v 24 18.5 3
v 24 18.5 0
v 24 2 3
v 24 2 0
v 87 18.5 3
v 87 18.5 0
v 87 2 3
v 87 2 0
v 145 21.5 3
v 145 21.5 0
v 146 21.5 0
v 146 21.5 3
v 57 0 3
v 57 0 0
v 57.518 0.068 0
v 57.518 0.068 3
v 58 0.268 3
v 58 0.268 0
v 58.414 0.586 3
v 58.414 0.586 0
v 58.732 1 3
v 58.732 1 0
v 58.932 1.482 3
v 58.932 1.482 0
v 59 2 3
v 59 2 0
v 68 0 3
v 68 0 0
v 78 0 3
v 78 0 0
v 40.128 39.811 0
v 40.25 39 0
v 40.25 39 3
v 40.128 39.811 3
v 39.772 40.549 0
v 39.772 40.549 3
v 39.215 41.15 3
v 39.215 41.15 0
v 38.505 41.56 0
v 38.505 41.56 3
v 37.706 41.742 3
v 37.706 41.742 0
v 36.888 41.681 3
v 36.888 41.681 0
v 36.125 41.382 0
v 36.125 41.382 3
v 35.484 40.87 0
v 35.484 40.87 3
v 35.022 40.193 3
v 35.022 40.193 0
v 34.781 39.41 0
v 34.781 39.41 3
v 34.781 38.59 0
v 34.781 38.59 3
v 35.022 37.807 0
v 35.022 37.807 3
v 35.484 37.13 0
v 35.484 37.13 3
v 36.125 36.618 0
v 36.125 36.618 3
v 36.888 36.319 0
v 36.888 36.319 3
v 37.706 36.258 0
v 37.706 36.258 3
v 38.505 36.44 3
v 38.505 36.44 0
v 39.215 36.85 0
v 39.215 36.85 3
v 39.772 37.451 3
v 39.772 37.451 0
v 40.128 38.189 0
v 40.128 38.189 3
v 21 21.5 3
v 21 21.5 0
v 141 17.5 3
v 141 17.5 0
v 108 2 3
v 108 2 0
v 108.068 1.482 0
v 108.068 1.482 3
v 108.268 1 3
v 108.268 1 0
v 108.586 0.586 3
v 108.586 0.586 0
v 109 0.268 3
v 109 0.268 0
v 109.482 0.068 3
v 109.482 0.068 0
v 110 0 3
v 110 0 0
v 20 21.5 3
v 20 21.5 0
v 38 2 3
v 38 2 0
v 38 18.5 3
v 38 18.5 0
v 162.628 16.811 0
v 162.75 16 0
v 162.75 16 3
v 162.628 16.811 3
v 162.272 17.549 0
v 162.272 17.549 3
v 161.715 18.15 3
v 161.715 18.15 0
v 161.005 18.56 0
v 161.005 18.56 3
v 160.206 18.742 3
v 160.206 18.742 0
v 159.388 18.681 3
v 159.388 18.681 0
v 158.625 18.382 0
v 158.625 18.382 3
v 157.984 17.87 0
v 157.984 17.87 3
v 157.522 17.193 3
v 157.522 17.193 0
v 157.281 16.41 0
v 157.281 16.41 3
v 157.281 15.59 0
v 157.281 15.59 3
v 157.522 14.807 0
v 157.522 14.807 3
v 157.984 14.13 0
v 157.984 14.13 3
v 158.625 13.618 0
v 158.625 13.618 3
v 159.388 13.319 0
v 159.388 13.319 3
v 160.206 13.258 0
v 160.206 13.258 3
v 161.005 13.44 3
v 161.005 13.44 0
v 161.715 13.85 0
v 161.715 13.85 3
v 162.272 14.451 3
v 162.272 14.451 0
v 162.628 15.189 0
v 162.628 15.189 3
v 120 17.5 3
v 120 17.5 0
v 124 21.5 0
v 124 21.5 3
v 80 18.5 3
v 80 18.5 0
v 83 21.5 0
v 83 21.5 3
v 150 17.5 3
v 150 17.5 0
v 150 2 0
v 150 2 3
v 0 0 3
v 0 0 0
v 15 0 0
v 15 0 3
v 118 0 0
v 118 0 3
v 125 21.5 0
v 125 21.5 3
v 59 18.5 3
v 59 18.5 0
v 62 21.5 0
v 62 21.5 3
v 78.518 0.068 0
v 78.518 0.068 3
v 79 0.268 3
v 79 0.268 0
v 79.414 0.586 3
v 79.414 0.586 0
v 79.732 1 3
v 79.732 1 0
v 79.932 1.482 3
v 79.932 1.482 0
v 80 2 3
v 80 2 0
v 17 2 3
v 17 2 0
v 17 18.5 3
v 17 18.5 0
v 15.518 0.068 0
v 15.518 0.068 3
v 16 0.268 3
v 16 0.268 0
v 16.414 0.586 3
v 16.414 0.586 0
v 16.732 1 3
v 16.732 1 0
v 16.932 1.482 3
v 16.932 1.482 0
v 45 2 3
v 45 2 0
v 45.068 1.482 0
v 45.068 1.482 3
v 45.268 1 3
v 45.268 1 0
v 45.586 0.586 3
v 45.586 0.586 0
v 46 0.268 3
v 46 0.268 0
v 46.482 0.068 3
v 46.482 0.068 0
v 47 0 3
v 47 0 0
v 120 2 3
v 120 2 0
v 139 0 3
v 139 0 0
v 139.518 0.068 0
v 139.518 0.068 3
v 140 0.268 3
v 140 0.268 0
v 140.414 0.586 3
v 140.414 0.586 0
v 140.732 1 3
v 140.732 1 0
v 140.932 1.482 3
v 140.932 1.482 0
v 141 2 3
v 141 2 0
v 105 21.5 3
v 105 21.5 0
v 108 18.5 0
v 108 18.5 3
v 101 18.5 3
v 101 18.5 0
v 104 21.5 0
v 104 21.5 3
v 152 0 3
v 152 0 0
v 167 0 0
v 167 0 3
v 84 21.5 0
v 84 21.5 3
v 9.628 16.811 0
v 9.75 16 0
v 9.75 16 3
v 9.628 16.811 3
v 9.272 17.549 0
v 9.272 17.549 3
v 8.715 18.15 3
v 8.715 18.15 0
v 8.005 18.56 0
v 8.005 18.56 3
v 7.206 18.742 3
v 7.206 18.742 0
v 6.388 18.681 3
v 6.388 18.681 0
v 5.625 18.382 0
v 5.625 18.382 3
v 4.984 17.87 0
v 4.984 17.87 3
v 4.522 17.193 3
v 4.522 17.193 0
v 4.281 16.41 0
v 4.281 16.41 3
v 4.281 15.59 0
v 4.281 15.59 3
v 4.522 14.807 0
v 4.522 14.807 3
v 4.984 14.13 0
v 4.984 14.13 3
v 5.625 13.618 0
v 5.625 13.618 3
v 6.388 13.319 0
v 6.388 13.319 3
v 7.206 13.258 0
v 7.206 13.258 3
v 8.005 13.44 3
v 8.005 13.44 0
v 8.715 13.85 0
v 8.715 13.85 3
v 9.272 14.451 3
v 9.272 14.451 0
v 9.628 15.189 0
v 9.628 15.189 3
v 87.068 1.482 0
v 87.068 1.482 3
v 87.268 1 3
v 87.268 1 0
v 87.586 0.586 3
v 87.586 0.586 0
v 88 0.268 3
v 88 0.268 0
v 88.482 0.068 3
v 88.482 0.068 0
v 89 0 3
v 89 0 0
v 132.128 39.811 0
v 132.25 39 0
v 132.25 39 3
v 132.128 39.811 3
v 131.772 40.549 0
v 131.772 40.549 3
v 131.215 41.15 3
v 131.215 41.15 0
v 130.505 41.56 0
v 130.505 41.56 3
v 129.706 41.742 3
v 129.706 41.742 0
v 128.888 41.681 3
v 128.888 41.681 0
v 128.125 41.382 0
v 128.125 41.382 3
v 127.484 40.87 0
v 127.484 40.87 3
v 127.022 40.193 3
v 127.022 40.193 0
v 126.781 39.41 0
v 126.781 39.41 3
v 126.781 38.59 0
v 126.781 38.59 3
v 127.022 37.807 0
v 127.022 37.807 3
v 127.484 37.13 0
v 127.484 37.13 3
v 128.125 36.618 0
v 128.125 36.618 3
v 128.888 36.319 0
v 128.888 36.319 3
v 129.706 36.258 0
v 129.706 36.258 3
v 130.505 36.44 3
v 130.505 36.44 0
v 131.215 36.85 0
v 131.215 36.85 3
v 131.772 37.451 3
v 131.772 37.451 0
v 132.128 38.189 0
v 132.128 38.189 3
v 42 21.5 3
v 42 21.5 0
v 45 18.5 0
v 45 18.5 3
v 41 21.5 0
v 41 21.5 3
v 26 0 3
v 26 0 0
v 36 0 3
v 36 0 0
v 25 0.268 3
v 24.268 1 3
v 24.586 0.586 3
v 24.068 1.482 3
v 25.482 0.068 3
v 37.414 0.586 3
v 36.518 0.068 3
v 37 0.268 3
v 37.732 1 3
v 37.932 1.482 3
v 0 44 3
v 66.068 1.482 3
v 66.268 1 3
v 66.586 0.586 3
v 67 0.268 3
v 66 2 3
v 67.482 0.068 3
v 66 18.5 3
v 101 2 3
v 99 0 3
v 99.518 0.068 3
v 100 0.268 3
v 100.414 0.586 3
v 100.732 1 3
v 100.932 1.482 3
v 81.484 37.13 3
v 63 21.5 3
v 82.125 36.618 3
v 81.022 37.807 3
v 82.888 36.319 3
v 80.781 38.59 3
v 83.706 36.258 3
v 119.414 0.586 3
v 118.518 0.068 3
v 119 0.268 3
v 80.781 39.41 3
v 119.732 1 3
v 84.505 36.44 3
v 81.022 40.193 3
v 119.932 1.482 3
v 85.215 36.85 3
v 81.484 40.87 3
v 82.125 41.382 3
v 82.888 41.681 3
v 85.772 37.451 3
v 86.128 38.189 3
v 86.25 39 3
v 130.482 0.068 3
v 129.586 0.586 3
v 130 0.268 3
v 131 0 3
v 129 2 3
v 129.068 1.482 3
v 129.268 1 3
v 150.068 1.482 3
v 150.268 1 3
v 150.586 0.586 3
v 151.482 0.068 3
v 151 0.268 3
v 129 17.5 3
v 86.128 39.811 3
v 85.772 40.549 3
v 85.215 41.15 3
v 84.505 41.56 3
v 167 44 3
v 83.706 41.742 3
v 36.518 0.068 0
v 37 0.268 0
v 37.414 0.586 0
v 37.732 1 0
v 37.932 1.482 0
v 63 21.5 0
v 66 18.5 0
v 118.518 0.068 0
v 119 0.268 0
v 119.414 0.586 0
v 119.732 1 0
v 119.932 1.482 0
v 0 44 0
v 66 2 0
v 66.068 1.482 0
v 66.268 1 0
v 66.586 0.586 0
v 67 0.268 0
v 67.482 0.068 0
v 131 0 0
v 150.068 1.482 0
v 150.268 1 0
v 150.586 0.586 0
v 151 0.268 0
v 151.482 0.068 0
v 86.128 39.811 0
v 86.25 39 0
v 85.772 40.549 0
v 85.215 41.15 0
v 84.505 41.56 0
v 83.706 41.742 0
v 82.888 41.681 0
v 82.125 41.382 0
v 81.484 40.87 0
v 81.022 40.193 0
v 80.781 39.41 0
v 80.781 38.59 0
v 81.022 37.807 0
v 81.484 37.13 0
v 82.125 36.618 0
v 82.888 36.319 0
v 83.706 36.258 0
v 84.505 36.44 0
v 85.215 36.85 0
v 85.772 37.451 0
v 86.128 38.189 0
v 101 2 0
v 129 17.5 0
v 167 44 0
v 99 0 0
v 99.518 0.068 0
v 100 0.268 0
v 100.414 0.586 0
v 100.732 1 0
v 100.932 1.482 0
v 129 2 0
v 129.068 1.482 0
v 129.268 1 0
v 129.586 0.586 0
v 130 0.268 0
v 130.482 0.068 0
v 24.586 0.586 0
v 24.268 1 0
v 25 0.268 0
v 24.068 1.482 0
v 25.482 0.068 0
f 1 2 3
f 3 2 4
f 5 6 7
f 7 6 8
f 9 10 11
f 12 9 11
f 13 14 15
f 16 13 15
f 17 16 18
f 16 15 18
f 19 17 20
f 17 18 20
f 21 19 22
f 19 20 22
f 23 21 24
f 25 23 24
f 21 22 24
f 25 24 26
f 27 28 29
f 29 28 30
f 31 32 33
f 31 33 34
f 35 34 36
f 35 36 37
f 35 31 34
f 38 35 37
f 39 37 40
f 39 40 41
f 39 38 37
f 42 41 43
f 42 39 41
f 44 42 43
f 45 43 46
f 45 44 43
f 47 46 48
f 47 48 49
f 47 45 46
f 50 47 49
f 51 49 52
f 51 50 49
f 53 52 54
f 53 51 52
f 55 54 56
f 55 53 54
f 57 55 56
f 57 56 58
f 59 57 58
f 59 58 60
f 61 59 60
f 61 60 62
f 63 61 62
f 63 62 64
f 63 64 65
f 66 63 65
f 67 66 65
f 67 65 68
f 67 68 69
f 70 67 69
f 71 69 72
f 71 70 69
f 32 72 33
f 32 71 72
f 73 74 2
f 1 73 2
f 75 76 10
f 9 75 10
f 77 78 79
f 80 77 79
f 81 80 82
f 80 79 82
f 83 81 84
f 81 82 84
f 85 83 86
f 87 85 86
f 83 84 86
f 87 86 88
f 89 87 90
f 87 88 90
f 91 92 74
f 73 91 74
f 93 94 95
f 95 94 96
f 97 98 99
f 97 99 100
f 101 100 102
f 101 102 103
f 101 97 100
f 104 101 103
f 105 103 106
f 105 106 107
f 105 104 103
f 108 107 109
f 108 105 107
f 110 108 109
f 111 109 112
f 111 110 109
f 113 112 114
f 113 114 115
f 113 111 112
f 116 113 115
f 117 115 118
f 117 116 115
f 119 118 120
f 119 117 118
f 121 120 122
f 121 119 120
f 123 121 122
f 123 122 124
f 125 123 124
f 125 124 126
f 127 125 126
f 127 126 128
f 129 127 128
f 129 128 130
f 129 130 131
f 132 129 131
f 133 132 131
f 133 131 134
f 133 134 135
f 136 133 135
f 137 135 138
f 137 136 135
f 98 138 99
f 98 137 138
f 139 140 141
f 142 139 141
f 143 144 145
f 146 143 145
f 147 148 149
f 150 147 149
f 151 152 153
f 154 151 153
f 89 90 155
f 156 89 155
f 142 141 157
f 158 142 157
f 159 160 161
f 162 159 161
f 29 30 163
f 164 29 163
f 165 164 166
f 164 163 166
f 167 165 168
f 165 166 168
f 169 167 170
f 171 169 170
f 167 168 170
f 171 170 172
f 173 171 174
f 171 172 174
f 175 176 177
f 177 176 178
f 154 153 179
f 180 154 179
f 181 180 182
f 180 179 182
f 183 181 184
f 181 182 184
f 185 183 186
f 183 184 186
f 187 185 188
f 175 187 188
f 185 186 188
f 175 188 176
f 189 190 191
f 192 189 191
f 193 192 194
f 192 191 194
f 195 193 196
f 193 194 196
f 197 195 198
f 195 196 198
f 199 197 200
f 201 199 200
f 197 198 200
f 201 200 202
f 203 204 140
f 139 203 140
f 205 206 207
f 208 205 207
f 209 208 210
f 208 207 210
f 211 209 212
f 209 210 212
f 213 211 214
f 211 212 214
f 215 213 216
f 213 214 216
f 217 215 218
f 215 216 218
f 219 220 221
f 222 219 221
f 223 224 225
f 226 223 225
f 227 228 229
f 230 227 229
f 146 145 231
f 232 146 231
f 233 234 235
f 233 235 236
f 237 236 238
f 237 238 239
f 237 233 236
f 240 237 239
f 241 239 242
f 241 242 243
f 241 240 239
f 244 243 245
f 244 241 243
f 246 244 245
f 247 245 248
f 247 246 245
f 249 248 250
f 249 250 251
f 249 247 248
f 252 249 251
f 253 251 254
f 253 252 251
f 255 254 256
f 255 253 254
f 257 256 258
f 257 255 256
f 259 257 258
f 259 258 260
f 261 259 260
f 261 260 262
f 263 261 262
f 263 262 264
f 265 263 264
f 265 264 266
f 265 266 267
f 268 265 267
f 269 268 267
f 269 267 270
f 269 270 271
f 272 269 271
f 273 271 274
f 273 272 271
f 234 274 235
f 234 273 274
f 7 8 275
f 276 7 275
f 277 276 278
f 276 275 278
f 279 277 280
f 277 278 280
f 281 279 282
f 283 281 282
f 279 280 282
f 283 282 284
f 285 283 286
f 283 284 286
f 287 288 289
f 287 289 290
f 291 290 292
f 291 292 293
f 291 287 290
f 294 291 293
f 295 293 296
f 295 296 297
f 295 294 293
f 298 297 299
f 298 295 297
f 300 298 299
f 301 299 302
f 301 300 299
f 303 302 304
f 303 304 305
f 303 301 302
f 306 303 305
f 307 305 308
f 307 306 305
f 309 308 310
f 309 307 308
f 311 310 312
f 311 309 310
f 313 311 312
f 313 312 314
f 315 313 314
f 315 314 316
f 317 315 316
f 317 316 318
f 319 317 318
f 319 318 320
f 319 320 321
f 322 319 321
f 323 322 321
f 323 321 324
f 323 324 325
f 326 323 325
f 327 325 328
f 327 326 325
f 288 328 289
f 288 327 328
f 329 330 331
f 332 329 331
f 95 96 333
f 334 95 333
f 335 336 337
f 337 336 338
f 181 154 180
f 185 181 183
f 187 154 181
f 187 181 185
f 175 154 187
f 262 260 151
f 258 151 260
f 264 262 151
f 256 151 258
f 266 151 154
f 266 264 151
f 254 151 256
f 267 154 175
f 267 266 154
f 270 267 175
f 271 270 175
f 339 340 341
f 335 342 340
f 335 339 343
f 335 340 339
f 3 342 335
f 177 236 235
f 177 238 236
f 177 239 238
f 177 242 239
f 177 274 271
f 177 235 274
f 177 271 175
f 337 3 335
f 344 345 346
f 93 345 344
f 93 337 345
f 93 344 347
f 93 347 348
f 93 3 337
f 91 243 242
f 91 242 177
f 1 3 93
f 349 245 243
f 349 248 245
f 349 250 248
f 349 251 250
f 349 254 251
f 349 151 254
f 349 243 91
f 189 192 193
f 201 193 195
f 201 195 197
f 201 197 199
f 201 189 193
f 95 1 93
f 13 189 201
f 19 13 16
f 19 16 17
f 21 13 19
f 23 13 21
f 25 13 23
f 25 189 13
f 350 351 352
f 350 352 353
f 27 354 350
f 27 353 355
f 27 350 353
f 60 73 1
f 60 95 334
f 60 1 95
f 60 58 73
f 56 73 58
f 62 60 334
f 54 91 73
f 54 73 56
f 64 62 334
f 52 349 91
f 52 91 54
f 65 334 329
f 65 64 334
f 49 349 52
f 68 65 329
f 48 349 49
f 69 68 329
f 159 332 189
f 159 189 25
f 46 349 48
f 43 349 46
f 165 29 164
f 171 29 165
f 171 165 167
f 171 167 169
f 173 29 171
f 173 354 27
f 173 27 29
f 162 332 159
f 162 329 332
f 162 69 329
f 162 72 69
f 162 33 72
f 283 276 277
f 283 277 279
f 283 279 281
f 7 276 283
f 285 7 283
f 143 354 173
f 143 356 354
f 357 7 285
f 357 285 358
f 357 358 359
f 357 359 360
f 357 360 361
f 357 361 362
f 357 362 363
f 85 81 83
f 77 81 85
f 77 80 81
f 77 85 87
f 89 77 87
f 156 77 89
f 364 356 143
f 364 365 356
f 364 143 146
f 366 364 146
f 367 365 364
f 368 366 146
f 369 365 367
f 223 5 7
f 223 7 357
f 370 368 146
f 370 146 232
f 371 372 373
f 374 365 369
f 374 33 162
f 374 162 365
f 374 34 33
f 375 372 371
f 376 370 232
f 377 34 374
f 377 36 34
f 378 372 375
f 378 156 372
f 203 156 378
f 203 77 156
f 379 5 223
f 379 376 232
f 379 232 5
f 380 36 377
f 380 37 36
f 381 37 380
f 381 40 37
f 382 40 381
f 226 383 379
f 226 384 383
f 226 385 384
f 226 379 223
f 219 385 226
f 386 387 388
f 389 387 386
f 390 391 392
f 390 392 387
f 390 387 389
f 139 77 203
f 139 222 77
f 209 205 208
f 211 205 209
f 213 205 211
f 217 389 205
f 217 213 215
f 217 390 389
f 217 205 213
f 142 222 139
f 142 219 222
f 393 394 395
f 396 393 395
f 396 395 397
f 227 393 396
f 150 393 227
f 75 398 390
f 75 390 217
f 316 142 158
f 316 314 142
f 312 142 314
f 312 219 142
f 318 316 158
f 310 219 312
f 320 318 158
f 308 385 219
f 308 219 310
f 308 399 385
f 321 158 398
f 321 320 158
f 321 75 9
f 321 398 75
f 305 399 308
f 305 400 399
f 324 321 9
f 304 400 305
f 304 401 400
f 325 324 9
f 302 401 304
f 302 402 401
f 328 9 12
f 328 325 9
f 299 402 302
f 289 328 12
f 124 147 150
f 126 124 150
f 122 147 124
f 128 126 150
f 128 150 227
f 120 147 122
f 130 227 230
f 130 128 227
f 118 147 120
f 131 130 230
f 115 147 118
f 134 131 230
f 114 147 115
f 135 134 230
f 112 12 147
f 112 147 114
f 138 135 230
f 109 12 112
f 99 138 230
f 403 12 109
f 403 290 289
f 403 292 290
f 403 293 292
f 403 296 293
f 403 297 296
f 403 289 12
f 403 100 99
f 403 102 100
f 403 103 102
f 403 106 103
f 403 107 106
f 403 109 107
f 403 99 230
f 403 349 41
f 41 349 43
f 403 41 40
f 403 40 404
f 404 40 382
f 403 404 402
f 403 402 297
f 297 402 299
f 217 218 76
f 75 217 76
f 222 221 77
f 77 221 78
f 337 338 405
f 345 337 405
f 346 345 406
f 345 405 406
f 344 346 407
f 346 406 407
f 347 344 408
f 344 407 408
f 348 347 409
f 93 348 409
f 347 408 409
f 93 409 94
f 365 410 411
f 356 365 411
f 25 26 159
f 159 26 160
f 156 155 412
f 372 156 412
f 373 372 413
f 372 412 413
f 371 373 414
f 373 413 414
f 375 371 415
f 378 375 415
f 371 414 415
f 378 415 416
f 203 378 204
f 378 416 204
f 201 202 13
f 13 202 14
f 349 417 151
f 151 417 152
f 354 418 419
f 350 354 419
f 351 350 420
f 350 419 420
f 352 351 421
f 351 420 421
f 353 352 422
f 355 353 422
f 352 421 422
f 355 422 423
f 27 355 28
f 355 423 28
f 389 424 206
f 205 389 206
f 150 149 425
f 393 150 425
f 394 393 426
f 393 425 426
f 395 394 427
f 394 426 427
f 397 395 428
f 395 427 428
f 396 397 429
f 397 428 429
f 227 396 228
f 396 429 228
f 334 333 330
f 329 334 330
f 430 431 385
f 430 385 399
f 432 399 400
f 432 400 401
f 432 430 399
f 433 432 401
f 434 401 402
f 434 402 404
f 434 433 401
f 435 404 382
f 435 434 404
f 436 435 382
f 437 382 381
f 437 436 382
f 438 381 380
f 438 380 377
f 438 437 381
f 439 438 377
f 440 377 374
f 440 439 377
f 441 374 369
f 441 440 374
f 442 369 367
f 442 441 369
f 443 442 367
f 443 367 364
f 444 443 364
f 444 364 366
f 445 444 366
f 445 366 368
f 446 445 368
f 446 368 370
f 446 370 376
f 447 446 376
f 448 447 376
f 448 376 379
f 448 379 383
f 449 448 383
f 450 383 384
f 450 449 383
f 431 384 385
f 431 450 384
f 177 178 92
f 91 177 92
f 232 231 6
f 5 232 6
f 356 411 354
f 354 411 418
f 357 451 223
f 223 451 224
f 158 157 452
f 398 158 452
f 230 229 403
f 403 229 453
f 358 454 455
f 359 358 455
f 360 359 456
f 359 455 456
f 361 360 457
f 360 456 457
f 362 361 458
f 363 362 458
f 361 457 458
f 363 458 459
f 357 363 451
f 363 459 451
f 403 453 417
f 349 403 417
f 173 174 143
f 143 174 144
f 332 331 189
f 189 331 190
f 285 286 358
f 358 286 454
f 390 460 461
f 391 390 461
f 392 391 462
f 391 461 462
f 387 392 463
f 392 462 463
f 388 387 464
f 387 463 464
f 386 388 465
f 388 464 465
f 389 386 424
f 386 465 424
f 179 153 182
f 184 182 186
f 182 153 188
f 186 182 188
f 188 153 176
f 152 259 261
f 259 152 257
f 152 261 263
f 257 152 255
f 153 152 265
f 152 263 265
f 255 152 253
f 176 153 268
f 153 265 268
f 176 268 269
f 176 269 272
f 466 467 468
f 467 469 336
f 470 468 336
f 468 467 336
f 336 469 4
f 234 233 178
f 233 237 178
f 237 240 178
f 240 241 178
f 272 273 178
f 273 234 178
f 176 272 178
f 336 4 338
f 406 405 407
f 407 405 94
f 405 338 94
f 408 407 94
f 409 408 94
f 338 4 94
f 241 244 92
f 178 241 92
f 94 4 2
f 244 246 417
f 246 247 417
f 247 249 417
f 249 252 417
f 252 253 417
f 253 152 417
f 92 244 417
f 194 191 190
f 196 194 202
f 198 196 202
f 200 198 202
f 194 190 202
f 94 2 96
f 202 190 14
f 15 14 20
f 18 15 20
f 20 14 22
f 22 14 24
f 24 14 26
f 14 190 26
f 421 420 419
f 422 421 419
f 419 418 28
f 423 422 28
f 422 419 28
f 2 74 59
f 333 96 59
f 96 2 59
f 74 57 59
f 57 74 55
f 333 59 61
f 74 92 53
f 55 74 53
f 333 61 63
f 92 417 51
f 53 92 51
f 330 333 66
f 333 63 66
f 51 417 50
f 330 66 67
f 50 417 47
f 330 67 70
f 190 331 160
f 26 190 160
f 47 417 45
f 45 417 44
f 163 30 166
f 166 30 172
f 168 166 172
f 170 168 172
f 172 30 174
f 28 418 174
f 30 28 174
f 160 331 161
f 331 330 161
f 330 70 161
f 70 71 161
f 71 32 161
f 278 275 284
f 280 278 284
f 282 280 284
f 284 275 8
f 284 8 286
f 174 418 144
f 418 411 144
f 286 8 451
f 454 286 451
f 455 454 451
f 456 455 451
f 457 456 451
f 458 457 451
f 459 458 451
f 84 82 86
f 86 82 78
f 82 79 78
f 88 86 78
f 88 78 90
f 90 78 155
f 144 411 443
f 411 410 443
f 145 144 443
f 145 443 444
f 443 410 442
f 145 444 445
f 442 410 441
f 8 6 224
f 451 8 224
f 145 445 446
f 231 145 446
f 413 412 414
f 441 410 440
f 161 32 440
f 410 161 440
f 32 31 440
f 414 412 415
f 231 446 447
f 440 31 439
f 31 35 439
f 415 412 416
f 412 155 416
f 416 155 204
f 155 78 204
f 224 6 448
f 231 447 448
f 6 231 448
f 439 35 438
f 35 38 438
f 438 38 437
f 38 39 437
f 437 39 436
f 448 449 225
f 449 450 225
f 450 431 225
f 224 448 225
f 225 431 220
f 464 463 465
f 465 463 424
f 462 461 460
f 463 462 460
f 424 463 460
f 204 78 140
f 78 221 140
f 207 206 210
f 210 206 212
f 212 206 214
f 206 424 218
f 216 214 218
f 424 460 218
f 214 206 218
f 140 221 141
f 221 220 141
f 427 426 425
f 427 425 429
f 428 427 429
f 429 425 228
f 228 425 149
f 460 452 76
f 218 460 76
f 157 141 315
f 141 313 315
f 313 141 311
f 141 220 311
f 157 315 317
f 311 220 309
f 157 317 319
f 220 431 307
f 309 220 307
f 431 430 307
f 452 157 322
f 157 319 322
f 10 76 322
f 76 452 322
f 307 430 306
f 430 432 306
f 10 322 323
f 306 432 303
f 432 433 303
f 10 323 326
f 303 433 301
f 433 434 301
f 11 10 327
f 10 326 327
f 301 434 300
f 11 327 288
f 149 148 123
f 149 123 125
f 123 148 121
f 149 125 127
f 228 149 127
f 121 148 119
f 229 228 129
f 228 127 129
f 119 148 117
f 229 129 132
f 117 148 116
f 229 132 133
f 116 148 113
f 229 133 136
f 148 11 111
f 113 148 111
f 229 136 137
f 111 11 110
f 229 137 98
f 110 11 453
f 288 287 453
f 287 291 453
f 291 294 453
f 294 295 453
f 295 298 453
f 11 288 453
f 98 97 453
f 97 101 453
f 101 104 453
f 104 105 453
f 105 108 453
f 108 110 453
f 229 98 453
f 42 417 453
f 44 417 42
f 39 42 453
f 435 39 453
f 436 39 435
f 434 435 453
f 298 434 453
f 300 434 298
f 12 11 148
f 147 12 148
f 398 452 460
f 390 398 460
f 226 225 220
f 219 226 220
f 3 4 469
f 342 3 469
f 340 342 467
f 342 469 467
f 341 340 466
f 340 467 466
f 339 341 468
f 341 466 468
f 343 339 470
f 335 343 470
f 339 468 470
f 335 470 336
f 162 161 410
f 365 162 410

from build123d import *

# Parameters (mm, degrees)
F0_R     = 2.75
F1_DEPTH = 3


with BuildPart() as f1:
    # F0 (on Top) → F1 (new body)
    with BuildSketch(Plane.XY):
        with BuildLine():
            Line((0, 44), (0, 0))
            Line((0, 0), (15, 0))
            ThreePointArc((15, 0), (16.414214, 0.585786), (17, 2))
            Line((17, 2), (17, 18.5))
            Line((17, 18.5), (17, 19))
            ThreePointArc((17, 19), (17.87868, 21.12132), (20, 22))
            Line((20, 22), (20.5, 22))
            Line((20.5, 22), (21, 22))
            ThreePointArc((21, 22), (23.12132, 21.12132), (24, 19))
            Line((24, 19), (24, 18.5))
            Line((24, 18.5), (24, 2))
            ThreePointArc((24, 2), (24.585786, 0.585786), (26, 0))
            Line((26, 0), (36, 0))
            ThreePointArc((36, 0), (37.414214, 0.585786), (38, 2))
            Line((38, 2), (38, 18.5))
            Line((38, 18.5), (38, 19))
            ThreePointArc((38, 19), (38.87868, 21.12132), (41, 22))
            Line((41, 22), (41.5, 22))
            Line((41.5, 22), (42, 22))
            ThreePointArc((42, 22), (44.12132, 21.12132), (45, 19))
            Line((45, 19), (45, 18.5))
            Line((45, 18.5), (45, 2))
            ThreePointArc((45, 2), (45.585786, 0.585786), (47, 0))
            Line((47, 0), (57, 0))
            ThreePointArc((57, 0), (58.414214, 0.585786), (59, 2))
            Line((59, 2), (59, 18.5))
            Line((59, 18.5), (59, 19))
            ThreePointArc((59, 19), (59.87868, 21.12132), (62, 22))
            Line((62, 22), (62.5, 22))
            Line((62.5, 22), (63, 22))
            ThreePointArc((63, 22), (65.12132, 21.12132), (66, 19))
            Line((66, 19), (66, 18.5))
            Line((66, 18.5), (66, 2))
            ThreePointArc((66, 2), (66.585786, 0.585786), (68, 0))
            Line((68, 0), (78, 0))
            ThreePointArc((78, 0), (79.414214, 0.585786), (80, 2))
            Line((80, 2), (80, 18.5))
            Line((80, 18.5), (80, 19))
            ThreePointArc((80, 19), (80.87868, 21.12132), (83, 22))
            Line((83, 22), (83.5, 22))
            Line((83.5, 22), (84, 22))
            ThreePointArc((84, 22), (86.12132, 21.12132), (87, 19))
            Line((87, 19), (87, 18.5))
            Line((87, 18.5), (87, 2))
            ThreePointArc((87, 2), (87.585786, 0.585786), (89, 0))
            Line((89, 0), (99, 0))
            ThreePointArc((99, 0), (100.414214, 0.585786), (101, 2))
            Line((101, 2), (101, 18.5))
            Line((101, 18.5), (101, 19))
            ThreePointArc((101, 19), (101.87868, 21.12132), (104, 22))
            Line((104, 22), (104.5, 22))
            Line((104.5, 22), (105, 22))
            ThreePointArc((105, 22), (107.12132, 21.12132), (108, 19))
            Line((108, 19), (108, 18.5))
            Line((108, 18.5), (108, 2))
            ThreePointArc((108, 2), (108.585786, 0.585786), (110, 0))
            Line((110, 0), (118, 0))
            ThreePointArc((118, 0), (119.414214, 0.585786), (120, 2))
            Line((120, 2), (120, 17.5))
            Line((120, 17.5), (120, 18))
            ThreePointArc((120, 18), (121.171573, 20.828427), (124, 22))
            Line((124, 22), (124.5, 22))
            Line((124.5, 22), (125, 22))
            ThreePointArc((125, 22), (127.828427, 20.828427), (129, 18))
            Line((129, 18), (129, 17.5))
            Line((129, 17.5), (129, 2))
            ThreePointArc((129, 2), (129.585786, 0.585786), (131, 0))
            Line((131, 0), (139, 0))
            ThreePointArc((139, 0), (140.414214, 0.585786), (141, 2))
            Line((141, 2), (141, 17.5))
            Line((141, 17.5), (141, 18))
            ThreePointArc((141, 18), (142.171573, 20.828427), (145, 22))
            Line((145, 22), (145.5, 22))
            Line((145.5, 22), (146, 22))
            ThreePointArc((146, 22), (148.828427, 20.828427), (150, 18))
            Line((150, 18), (150, 17.5))
            Line((150, 17.5), (150, 2))
            ThreePointArc((150, 2), (150.585786, 0.585786), (152, 0))
            Line((152, 0), (167, 0))
            Line((167, 0), (167, 44))
            Line((167, 44), (0, 44))
        make_face()
        with Locations((7, 16)):
            Circle(F0_R, mode=Mode.SUBTRACT)
        with Locations((160, 16)):
            Circle(F0_R, mode=Mode.SUBTRACT)
        with Locations((37.5, 39)):
            Circle(F0_R, mode=Mode.SUBTRACT)
        with Locations((83.5, 39)):
            Circle(F0_R, mode=Mode.SUBTRACT)
        with Locations((129.5, 39)):
            Circle(F0_R, mode=Mode.SUBTRACT)
        with BuildLine():
            Line((17, 19), (17, 18.5))
            Line((17, 18.5), (20, 21.5))
            Line((20, 21.5), (20.5, 22))
            Line((20.5, 22), (20, 22))
            ThreePointArc((20, 22), (17.87868, 21.12132), (17, 19))
        make_face()
        with BuildLine():
            Line((21, 22), (20.5, 22))
            Line((20.5, 22), (21, 21.5))
            Line((21, 21.5), (24, 18.5))
            Line((24, 18.5), (24, 19))
            ThreePointArc((24, 19), (23.12132, 21.12132), (21, 22))
        make_face()
        Polygon((20.5, 22), (20, 21.5), (21, 21.5), align=None)
        with BuildLine():
            Line((38, 19), (38, 18.5))
            Line((38, 18.5), (41, 21.5))
            Line((41, 21.5), (41.5, 22))
            Line((41.5, 22), (41, 22))
            ThreePointArc((41, 22), (38.87868, 21.12132), (38, 19))
        make_face()
        Polygon((41.5, 22), (41, 21.5), (42, 21.5), align=None)
        with BuildLine():
            Line((42, 22), (41.5, 22))
            Line((41.5, 22), (42, 21.5))
            Line((42, 21.5), (45, 18.5))
            Line((45, 18.5), (45, 19))
            ThreePointArc((45, 19), (44.12132, 21.12132), (42, 22))
        make_face()
        with BuildLine():
            Line((80, 19), (80, 18.5))
            Line((80, 18.5), (83, 21.5))
            Line((83, 21.5), (83.5, 22))
            Line((83.5, 22), (83, 22))
            ThreePointArc((83, 22), (80.87868, 21.12132), (80, 19))
        make_face()
        Polygon((83.5, 22), (83, 21.5), (84, 21.5), align=None)
        with BuildLine():
            Line((84, 22), (83.5, 22))
            Line((83.5, 22), (84, 21.5))
            Line((84, 21.5), (87, 18.5))
            Line((87, 18.5), (87, 19))
            ThreePointArc((87, 19), (86.12132, 21.12132), (84, 22))
        make_face()
        with BuildLine():
            Line((101, 18.5), (104, 21.5))
            Line((104, 21.5), (104.5, 22))
            Line((104.5, 22), (104, 22))
            ThreePointArc((104, 22), (101.87868, 21.12132), (101, 19))
            Line((101, 19), (101, 18.5))
        make_face()
        Polygon((104, 21.5), (105, 21.5), (104.5, 22), align=None)
        with BuildLine():
            Line((105, 21.5), (108, 18.5))
            Line((108, 18.5), (108, 19))
            ThreePointArc((108, 19), (107.12132, 21.12132), (105, 22))
            Line((105, 22), (104.5, 22))
            Line((104.5, 22), (105, 21.5))
        make_face()
        with BuildLine():
            Line((124, 21.5), (124.5, 22))
            Line((124.5, 22), (124, 22))
            ThreePointArc((124, 22), (121.171573, 20.828427), (120, 18))
            Line((120, 18), (120, 17.5))
            Line((120, 17.5), (124, 21.5))
        make_face()
        Polygon((124, 21.5), (125, 21.5), (124.5, 22), align=None)
        with BuildLine():
            Line((125, 21.5), (129, 17.5))
            Line((129, 17.5), (129, 18))
            ThreePointArc((129, 18), (127.828427, 20.828427), (125, 22))
            Line((125, 22), (124.5, 22))
            Line((124.5, 22), (125, 21.5))
        make_face()
        with BuildLine():
            Line((141, 17.5), (145, 21.5))
            Line((145, 21.5), (145.5, 22))
            Line((145.5, 22), (145, 22))
            ThreePointArc((145, 22), (142.171573, 20.828427), (141, 18))
            Line((141, 18), (141, 17.5))
        make_face()
        Polygon((145, 21.5), (146, 21.5), (145.5, 22), align=None)
        with BuildLine():
            Line((146, 21.5), (150, 17.5))
            Line((150, 17.5), (150, 18))
            ThreePointArc((150, 18), (148.828427, 20.828427), (146, 22))
            Line((146, 22), (145.5, 22))
            Line((145.5, 22), (146, 21.5))
        make_face()
        with BuildLine():
            Line((59, 19), (59, 18.5))
            Line((59, 18.5), (62, 21.5))
            Line((62, 21.5), (62.5, 22))
            Line((62.5, 22), (62, 22))
            ThreePointArc((62, 22), (59.87868, 21.12132), (59, 19))
        make_face()
        Polygon((62.5, 22), (62, 21.5), (63, 21.5), align=None)
        with BuildLine():
            Line((63, 22), (62.5, 22))
            Line((62.5, 22), (63, 21.5))
            Line((63, 21.5), (66, 18.5))
            Line((66, 18.5), (66, 19))
            ThreePointArc((66, 19), (65.12132, 21.12132), (63, 22))
        make_face()
    extrude(amount=F1_DEPTH)


solid = f1.part
